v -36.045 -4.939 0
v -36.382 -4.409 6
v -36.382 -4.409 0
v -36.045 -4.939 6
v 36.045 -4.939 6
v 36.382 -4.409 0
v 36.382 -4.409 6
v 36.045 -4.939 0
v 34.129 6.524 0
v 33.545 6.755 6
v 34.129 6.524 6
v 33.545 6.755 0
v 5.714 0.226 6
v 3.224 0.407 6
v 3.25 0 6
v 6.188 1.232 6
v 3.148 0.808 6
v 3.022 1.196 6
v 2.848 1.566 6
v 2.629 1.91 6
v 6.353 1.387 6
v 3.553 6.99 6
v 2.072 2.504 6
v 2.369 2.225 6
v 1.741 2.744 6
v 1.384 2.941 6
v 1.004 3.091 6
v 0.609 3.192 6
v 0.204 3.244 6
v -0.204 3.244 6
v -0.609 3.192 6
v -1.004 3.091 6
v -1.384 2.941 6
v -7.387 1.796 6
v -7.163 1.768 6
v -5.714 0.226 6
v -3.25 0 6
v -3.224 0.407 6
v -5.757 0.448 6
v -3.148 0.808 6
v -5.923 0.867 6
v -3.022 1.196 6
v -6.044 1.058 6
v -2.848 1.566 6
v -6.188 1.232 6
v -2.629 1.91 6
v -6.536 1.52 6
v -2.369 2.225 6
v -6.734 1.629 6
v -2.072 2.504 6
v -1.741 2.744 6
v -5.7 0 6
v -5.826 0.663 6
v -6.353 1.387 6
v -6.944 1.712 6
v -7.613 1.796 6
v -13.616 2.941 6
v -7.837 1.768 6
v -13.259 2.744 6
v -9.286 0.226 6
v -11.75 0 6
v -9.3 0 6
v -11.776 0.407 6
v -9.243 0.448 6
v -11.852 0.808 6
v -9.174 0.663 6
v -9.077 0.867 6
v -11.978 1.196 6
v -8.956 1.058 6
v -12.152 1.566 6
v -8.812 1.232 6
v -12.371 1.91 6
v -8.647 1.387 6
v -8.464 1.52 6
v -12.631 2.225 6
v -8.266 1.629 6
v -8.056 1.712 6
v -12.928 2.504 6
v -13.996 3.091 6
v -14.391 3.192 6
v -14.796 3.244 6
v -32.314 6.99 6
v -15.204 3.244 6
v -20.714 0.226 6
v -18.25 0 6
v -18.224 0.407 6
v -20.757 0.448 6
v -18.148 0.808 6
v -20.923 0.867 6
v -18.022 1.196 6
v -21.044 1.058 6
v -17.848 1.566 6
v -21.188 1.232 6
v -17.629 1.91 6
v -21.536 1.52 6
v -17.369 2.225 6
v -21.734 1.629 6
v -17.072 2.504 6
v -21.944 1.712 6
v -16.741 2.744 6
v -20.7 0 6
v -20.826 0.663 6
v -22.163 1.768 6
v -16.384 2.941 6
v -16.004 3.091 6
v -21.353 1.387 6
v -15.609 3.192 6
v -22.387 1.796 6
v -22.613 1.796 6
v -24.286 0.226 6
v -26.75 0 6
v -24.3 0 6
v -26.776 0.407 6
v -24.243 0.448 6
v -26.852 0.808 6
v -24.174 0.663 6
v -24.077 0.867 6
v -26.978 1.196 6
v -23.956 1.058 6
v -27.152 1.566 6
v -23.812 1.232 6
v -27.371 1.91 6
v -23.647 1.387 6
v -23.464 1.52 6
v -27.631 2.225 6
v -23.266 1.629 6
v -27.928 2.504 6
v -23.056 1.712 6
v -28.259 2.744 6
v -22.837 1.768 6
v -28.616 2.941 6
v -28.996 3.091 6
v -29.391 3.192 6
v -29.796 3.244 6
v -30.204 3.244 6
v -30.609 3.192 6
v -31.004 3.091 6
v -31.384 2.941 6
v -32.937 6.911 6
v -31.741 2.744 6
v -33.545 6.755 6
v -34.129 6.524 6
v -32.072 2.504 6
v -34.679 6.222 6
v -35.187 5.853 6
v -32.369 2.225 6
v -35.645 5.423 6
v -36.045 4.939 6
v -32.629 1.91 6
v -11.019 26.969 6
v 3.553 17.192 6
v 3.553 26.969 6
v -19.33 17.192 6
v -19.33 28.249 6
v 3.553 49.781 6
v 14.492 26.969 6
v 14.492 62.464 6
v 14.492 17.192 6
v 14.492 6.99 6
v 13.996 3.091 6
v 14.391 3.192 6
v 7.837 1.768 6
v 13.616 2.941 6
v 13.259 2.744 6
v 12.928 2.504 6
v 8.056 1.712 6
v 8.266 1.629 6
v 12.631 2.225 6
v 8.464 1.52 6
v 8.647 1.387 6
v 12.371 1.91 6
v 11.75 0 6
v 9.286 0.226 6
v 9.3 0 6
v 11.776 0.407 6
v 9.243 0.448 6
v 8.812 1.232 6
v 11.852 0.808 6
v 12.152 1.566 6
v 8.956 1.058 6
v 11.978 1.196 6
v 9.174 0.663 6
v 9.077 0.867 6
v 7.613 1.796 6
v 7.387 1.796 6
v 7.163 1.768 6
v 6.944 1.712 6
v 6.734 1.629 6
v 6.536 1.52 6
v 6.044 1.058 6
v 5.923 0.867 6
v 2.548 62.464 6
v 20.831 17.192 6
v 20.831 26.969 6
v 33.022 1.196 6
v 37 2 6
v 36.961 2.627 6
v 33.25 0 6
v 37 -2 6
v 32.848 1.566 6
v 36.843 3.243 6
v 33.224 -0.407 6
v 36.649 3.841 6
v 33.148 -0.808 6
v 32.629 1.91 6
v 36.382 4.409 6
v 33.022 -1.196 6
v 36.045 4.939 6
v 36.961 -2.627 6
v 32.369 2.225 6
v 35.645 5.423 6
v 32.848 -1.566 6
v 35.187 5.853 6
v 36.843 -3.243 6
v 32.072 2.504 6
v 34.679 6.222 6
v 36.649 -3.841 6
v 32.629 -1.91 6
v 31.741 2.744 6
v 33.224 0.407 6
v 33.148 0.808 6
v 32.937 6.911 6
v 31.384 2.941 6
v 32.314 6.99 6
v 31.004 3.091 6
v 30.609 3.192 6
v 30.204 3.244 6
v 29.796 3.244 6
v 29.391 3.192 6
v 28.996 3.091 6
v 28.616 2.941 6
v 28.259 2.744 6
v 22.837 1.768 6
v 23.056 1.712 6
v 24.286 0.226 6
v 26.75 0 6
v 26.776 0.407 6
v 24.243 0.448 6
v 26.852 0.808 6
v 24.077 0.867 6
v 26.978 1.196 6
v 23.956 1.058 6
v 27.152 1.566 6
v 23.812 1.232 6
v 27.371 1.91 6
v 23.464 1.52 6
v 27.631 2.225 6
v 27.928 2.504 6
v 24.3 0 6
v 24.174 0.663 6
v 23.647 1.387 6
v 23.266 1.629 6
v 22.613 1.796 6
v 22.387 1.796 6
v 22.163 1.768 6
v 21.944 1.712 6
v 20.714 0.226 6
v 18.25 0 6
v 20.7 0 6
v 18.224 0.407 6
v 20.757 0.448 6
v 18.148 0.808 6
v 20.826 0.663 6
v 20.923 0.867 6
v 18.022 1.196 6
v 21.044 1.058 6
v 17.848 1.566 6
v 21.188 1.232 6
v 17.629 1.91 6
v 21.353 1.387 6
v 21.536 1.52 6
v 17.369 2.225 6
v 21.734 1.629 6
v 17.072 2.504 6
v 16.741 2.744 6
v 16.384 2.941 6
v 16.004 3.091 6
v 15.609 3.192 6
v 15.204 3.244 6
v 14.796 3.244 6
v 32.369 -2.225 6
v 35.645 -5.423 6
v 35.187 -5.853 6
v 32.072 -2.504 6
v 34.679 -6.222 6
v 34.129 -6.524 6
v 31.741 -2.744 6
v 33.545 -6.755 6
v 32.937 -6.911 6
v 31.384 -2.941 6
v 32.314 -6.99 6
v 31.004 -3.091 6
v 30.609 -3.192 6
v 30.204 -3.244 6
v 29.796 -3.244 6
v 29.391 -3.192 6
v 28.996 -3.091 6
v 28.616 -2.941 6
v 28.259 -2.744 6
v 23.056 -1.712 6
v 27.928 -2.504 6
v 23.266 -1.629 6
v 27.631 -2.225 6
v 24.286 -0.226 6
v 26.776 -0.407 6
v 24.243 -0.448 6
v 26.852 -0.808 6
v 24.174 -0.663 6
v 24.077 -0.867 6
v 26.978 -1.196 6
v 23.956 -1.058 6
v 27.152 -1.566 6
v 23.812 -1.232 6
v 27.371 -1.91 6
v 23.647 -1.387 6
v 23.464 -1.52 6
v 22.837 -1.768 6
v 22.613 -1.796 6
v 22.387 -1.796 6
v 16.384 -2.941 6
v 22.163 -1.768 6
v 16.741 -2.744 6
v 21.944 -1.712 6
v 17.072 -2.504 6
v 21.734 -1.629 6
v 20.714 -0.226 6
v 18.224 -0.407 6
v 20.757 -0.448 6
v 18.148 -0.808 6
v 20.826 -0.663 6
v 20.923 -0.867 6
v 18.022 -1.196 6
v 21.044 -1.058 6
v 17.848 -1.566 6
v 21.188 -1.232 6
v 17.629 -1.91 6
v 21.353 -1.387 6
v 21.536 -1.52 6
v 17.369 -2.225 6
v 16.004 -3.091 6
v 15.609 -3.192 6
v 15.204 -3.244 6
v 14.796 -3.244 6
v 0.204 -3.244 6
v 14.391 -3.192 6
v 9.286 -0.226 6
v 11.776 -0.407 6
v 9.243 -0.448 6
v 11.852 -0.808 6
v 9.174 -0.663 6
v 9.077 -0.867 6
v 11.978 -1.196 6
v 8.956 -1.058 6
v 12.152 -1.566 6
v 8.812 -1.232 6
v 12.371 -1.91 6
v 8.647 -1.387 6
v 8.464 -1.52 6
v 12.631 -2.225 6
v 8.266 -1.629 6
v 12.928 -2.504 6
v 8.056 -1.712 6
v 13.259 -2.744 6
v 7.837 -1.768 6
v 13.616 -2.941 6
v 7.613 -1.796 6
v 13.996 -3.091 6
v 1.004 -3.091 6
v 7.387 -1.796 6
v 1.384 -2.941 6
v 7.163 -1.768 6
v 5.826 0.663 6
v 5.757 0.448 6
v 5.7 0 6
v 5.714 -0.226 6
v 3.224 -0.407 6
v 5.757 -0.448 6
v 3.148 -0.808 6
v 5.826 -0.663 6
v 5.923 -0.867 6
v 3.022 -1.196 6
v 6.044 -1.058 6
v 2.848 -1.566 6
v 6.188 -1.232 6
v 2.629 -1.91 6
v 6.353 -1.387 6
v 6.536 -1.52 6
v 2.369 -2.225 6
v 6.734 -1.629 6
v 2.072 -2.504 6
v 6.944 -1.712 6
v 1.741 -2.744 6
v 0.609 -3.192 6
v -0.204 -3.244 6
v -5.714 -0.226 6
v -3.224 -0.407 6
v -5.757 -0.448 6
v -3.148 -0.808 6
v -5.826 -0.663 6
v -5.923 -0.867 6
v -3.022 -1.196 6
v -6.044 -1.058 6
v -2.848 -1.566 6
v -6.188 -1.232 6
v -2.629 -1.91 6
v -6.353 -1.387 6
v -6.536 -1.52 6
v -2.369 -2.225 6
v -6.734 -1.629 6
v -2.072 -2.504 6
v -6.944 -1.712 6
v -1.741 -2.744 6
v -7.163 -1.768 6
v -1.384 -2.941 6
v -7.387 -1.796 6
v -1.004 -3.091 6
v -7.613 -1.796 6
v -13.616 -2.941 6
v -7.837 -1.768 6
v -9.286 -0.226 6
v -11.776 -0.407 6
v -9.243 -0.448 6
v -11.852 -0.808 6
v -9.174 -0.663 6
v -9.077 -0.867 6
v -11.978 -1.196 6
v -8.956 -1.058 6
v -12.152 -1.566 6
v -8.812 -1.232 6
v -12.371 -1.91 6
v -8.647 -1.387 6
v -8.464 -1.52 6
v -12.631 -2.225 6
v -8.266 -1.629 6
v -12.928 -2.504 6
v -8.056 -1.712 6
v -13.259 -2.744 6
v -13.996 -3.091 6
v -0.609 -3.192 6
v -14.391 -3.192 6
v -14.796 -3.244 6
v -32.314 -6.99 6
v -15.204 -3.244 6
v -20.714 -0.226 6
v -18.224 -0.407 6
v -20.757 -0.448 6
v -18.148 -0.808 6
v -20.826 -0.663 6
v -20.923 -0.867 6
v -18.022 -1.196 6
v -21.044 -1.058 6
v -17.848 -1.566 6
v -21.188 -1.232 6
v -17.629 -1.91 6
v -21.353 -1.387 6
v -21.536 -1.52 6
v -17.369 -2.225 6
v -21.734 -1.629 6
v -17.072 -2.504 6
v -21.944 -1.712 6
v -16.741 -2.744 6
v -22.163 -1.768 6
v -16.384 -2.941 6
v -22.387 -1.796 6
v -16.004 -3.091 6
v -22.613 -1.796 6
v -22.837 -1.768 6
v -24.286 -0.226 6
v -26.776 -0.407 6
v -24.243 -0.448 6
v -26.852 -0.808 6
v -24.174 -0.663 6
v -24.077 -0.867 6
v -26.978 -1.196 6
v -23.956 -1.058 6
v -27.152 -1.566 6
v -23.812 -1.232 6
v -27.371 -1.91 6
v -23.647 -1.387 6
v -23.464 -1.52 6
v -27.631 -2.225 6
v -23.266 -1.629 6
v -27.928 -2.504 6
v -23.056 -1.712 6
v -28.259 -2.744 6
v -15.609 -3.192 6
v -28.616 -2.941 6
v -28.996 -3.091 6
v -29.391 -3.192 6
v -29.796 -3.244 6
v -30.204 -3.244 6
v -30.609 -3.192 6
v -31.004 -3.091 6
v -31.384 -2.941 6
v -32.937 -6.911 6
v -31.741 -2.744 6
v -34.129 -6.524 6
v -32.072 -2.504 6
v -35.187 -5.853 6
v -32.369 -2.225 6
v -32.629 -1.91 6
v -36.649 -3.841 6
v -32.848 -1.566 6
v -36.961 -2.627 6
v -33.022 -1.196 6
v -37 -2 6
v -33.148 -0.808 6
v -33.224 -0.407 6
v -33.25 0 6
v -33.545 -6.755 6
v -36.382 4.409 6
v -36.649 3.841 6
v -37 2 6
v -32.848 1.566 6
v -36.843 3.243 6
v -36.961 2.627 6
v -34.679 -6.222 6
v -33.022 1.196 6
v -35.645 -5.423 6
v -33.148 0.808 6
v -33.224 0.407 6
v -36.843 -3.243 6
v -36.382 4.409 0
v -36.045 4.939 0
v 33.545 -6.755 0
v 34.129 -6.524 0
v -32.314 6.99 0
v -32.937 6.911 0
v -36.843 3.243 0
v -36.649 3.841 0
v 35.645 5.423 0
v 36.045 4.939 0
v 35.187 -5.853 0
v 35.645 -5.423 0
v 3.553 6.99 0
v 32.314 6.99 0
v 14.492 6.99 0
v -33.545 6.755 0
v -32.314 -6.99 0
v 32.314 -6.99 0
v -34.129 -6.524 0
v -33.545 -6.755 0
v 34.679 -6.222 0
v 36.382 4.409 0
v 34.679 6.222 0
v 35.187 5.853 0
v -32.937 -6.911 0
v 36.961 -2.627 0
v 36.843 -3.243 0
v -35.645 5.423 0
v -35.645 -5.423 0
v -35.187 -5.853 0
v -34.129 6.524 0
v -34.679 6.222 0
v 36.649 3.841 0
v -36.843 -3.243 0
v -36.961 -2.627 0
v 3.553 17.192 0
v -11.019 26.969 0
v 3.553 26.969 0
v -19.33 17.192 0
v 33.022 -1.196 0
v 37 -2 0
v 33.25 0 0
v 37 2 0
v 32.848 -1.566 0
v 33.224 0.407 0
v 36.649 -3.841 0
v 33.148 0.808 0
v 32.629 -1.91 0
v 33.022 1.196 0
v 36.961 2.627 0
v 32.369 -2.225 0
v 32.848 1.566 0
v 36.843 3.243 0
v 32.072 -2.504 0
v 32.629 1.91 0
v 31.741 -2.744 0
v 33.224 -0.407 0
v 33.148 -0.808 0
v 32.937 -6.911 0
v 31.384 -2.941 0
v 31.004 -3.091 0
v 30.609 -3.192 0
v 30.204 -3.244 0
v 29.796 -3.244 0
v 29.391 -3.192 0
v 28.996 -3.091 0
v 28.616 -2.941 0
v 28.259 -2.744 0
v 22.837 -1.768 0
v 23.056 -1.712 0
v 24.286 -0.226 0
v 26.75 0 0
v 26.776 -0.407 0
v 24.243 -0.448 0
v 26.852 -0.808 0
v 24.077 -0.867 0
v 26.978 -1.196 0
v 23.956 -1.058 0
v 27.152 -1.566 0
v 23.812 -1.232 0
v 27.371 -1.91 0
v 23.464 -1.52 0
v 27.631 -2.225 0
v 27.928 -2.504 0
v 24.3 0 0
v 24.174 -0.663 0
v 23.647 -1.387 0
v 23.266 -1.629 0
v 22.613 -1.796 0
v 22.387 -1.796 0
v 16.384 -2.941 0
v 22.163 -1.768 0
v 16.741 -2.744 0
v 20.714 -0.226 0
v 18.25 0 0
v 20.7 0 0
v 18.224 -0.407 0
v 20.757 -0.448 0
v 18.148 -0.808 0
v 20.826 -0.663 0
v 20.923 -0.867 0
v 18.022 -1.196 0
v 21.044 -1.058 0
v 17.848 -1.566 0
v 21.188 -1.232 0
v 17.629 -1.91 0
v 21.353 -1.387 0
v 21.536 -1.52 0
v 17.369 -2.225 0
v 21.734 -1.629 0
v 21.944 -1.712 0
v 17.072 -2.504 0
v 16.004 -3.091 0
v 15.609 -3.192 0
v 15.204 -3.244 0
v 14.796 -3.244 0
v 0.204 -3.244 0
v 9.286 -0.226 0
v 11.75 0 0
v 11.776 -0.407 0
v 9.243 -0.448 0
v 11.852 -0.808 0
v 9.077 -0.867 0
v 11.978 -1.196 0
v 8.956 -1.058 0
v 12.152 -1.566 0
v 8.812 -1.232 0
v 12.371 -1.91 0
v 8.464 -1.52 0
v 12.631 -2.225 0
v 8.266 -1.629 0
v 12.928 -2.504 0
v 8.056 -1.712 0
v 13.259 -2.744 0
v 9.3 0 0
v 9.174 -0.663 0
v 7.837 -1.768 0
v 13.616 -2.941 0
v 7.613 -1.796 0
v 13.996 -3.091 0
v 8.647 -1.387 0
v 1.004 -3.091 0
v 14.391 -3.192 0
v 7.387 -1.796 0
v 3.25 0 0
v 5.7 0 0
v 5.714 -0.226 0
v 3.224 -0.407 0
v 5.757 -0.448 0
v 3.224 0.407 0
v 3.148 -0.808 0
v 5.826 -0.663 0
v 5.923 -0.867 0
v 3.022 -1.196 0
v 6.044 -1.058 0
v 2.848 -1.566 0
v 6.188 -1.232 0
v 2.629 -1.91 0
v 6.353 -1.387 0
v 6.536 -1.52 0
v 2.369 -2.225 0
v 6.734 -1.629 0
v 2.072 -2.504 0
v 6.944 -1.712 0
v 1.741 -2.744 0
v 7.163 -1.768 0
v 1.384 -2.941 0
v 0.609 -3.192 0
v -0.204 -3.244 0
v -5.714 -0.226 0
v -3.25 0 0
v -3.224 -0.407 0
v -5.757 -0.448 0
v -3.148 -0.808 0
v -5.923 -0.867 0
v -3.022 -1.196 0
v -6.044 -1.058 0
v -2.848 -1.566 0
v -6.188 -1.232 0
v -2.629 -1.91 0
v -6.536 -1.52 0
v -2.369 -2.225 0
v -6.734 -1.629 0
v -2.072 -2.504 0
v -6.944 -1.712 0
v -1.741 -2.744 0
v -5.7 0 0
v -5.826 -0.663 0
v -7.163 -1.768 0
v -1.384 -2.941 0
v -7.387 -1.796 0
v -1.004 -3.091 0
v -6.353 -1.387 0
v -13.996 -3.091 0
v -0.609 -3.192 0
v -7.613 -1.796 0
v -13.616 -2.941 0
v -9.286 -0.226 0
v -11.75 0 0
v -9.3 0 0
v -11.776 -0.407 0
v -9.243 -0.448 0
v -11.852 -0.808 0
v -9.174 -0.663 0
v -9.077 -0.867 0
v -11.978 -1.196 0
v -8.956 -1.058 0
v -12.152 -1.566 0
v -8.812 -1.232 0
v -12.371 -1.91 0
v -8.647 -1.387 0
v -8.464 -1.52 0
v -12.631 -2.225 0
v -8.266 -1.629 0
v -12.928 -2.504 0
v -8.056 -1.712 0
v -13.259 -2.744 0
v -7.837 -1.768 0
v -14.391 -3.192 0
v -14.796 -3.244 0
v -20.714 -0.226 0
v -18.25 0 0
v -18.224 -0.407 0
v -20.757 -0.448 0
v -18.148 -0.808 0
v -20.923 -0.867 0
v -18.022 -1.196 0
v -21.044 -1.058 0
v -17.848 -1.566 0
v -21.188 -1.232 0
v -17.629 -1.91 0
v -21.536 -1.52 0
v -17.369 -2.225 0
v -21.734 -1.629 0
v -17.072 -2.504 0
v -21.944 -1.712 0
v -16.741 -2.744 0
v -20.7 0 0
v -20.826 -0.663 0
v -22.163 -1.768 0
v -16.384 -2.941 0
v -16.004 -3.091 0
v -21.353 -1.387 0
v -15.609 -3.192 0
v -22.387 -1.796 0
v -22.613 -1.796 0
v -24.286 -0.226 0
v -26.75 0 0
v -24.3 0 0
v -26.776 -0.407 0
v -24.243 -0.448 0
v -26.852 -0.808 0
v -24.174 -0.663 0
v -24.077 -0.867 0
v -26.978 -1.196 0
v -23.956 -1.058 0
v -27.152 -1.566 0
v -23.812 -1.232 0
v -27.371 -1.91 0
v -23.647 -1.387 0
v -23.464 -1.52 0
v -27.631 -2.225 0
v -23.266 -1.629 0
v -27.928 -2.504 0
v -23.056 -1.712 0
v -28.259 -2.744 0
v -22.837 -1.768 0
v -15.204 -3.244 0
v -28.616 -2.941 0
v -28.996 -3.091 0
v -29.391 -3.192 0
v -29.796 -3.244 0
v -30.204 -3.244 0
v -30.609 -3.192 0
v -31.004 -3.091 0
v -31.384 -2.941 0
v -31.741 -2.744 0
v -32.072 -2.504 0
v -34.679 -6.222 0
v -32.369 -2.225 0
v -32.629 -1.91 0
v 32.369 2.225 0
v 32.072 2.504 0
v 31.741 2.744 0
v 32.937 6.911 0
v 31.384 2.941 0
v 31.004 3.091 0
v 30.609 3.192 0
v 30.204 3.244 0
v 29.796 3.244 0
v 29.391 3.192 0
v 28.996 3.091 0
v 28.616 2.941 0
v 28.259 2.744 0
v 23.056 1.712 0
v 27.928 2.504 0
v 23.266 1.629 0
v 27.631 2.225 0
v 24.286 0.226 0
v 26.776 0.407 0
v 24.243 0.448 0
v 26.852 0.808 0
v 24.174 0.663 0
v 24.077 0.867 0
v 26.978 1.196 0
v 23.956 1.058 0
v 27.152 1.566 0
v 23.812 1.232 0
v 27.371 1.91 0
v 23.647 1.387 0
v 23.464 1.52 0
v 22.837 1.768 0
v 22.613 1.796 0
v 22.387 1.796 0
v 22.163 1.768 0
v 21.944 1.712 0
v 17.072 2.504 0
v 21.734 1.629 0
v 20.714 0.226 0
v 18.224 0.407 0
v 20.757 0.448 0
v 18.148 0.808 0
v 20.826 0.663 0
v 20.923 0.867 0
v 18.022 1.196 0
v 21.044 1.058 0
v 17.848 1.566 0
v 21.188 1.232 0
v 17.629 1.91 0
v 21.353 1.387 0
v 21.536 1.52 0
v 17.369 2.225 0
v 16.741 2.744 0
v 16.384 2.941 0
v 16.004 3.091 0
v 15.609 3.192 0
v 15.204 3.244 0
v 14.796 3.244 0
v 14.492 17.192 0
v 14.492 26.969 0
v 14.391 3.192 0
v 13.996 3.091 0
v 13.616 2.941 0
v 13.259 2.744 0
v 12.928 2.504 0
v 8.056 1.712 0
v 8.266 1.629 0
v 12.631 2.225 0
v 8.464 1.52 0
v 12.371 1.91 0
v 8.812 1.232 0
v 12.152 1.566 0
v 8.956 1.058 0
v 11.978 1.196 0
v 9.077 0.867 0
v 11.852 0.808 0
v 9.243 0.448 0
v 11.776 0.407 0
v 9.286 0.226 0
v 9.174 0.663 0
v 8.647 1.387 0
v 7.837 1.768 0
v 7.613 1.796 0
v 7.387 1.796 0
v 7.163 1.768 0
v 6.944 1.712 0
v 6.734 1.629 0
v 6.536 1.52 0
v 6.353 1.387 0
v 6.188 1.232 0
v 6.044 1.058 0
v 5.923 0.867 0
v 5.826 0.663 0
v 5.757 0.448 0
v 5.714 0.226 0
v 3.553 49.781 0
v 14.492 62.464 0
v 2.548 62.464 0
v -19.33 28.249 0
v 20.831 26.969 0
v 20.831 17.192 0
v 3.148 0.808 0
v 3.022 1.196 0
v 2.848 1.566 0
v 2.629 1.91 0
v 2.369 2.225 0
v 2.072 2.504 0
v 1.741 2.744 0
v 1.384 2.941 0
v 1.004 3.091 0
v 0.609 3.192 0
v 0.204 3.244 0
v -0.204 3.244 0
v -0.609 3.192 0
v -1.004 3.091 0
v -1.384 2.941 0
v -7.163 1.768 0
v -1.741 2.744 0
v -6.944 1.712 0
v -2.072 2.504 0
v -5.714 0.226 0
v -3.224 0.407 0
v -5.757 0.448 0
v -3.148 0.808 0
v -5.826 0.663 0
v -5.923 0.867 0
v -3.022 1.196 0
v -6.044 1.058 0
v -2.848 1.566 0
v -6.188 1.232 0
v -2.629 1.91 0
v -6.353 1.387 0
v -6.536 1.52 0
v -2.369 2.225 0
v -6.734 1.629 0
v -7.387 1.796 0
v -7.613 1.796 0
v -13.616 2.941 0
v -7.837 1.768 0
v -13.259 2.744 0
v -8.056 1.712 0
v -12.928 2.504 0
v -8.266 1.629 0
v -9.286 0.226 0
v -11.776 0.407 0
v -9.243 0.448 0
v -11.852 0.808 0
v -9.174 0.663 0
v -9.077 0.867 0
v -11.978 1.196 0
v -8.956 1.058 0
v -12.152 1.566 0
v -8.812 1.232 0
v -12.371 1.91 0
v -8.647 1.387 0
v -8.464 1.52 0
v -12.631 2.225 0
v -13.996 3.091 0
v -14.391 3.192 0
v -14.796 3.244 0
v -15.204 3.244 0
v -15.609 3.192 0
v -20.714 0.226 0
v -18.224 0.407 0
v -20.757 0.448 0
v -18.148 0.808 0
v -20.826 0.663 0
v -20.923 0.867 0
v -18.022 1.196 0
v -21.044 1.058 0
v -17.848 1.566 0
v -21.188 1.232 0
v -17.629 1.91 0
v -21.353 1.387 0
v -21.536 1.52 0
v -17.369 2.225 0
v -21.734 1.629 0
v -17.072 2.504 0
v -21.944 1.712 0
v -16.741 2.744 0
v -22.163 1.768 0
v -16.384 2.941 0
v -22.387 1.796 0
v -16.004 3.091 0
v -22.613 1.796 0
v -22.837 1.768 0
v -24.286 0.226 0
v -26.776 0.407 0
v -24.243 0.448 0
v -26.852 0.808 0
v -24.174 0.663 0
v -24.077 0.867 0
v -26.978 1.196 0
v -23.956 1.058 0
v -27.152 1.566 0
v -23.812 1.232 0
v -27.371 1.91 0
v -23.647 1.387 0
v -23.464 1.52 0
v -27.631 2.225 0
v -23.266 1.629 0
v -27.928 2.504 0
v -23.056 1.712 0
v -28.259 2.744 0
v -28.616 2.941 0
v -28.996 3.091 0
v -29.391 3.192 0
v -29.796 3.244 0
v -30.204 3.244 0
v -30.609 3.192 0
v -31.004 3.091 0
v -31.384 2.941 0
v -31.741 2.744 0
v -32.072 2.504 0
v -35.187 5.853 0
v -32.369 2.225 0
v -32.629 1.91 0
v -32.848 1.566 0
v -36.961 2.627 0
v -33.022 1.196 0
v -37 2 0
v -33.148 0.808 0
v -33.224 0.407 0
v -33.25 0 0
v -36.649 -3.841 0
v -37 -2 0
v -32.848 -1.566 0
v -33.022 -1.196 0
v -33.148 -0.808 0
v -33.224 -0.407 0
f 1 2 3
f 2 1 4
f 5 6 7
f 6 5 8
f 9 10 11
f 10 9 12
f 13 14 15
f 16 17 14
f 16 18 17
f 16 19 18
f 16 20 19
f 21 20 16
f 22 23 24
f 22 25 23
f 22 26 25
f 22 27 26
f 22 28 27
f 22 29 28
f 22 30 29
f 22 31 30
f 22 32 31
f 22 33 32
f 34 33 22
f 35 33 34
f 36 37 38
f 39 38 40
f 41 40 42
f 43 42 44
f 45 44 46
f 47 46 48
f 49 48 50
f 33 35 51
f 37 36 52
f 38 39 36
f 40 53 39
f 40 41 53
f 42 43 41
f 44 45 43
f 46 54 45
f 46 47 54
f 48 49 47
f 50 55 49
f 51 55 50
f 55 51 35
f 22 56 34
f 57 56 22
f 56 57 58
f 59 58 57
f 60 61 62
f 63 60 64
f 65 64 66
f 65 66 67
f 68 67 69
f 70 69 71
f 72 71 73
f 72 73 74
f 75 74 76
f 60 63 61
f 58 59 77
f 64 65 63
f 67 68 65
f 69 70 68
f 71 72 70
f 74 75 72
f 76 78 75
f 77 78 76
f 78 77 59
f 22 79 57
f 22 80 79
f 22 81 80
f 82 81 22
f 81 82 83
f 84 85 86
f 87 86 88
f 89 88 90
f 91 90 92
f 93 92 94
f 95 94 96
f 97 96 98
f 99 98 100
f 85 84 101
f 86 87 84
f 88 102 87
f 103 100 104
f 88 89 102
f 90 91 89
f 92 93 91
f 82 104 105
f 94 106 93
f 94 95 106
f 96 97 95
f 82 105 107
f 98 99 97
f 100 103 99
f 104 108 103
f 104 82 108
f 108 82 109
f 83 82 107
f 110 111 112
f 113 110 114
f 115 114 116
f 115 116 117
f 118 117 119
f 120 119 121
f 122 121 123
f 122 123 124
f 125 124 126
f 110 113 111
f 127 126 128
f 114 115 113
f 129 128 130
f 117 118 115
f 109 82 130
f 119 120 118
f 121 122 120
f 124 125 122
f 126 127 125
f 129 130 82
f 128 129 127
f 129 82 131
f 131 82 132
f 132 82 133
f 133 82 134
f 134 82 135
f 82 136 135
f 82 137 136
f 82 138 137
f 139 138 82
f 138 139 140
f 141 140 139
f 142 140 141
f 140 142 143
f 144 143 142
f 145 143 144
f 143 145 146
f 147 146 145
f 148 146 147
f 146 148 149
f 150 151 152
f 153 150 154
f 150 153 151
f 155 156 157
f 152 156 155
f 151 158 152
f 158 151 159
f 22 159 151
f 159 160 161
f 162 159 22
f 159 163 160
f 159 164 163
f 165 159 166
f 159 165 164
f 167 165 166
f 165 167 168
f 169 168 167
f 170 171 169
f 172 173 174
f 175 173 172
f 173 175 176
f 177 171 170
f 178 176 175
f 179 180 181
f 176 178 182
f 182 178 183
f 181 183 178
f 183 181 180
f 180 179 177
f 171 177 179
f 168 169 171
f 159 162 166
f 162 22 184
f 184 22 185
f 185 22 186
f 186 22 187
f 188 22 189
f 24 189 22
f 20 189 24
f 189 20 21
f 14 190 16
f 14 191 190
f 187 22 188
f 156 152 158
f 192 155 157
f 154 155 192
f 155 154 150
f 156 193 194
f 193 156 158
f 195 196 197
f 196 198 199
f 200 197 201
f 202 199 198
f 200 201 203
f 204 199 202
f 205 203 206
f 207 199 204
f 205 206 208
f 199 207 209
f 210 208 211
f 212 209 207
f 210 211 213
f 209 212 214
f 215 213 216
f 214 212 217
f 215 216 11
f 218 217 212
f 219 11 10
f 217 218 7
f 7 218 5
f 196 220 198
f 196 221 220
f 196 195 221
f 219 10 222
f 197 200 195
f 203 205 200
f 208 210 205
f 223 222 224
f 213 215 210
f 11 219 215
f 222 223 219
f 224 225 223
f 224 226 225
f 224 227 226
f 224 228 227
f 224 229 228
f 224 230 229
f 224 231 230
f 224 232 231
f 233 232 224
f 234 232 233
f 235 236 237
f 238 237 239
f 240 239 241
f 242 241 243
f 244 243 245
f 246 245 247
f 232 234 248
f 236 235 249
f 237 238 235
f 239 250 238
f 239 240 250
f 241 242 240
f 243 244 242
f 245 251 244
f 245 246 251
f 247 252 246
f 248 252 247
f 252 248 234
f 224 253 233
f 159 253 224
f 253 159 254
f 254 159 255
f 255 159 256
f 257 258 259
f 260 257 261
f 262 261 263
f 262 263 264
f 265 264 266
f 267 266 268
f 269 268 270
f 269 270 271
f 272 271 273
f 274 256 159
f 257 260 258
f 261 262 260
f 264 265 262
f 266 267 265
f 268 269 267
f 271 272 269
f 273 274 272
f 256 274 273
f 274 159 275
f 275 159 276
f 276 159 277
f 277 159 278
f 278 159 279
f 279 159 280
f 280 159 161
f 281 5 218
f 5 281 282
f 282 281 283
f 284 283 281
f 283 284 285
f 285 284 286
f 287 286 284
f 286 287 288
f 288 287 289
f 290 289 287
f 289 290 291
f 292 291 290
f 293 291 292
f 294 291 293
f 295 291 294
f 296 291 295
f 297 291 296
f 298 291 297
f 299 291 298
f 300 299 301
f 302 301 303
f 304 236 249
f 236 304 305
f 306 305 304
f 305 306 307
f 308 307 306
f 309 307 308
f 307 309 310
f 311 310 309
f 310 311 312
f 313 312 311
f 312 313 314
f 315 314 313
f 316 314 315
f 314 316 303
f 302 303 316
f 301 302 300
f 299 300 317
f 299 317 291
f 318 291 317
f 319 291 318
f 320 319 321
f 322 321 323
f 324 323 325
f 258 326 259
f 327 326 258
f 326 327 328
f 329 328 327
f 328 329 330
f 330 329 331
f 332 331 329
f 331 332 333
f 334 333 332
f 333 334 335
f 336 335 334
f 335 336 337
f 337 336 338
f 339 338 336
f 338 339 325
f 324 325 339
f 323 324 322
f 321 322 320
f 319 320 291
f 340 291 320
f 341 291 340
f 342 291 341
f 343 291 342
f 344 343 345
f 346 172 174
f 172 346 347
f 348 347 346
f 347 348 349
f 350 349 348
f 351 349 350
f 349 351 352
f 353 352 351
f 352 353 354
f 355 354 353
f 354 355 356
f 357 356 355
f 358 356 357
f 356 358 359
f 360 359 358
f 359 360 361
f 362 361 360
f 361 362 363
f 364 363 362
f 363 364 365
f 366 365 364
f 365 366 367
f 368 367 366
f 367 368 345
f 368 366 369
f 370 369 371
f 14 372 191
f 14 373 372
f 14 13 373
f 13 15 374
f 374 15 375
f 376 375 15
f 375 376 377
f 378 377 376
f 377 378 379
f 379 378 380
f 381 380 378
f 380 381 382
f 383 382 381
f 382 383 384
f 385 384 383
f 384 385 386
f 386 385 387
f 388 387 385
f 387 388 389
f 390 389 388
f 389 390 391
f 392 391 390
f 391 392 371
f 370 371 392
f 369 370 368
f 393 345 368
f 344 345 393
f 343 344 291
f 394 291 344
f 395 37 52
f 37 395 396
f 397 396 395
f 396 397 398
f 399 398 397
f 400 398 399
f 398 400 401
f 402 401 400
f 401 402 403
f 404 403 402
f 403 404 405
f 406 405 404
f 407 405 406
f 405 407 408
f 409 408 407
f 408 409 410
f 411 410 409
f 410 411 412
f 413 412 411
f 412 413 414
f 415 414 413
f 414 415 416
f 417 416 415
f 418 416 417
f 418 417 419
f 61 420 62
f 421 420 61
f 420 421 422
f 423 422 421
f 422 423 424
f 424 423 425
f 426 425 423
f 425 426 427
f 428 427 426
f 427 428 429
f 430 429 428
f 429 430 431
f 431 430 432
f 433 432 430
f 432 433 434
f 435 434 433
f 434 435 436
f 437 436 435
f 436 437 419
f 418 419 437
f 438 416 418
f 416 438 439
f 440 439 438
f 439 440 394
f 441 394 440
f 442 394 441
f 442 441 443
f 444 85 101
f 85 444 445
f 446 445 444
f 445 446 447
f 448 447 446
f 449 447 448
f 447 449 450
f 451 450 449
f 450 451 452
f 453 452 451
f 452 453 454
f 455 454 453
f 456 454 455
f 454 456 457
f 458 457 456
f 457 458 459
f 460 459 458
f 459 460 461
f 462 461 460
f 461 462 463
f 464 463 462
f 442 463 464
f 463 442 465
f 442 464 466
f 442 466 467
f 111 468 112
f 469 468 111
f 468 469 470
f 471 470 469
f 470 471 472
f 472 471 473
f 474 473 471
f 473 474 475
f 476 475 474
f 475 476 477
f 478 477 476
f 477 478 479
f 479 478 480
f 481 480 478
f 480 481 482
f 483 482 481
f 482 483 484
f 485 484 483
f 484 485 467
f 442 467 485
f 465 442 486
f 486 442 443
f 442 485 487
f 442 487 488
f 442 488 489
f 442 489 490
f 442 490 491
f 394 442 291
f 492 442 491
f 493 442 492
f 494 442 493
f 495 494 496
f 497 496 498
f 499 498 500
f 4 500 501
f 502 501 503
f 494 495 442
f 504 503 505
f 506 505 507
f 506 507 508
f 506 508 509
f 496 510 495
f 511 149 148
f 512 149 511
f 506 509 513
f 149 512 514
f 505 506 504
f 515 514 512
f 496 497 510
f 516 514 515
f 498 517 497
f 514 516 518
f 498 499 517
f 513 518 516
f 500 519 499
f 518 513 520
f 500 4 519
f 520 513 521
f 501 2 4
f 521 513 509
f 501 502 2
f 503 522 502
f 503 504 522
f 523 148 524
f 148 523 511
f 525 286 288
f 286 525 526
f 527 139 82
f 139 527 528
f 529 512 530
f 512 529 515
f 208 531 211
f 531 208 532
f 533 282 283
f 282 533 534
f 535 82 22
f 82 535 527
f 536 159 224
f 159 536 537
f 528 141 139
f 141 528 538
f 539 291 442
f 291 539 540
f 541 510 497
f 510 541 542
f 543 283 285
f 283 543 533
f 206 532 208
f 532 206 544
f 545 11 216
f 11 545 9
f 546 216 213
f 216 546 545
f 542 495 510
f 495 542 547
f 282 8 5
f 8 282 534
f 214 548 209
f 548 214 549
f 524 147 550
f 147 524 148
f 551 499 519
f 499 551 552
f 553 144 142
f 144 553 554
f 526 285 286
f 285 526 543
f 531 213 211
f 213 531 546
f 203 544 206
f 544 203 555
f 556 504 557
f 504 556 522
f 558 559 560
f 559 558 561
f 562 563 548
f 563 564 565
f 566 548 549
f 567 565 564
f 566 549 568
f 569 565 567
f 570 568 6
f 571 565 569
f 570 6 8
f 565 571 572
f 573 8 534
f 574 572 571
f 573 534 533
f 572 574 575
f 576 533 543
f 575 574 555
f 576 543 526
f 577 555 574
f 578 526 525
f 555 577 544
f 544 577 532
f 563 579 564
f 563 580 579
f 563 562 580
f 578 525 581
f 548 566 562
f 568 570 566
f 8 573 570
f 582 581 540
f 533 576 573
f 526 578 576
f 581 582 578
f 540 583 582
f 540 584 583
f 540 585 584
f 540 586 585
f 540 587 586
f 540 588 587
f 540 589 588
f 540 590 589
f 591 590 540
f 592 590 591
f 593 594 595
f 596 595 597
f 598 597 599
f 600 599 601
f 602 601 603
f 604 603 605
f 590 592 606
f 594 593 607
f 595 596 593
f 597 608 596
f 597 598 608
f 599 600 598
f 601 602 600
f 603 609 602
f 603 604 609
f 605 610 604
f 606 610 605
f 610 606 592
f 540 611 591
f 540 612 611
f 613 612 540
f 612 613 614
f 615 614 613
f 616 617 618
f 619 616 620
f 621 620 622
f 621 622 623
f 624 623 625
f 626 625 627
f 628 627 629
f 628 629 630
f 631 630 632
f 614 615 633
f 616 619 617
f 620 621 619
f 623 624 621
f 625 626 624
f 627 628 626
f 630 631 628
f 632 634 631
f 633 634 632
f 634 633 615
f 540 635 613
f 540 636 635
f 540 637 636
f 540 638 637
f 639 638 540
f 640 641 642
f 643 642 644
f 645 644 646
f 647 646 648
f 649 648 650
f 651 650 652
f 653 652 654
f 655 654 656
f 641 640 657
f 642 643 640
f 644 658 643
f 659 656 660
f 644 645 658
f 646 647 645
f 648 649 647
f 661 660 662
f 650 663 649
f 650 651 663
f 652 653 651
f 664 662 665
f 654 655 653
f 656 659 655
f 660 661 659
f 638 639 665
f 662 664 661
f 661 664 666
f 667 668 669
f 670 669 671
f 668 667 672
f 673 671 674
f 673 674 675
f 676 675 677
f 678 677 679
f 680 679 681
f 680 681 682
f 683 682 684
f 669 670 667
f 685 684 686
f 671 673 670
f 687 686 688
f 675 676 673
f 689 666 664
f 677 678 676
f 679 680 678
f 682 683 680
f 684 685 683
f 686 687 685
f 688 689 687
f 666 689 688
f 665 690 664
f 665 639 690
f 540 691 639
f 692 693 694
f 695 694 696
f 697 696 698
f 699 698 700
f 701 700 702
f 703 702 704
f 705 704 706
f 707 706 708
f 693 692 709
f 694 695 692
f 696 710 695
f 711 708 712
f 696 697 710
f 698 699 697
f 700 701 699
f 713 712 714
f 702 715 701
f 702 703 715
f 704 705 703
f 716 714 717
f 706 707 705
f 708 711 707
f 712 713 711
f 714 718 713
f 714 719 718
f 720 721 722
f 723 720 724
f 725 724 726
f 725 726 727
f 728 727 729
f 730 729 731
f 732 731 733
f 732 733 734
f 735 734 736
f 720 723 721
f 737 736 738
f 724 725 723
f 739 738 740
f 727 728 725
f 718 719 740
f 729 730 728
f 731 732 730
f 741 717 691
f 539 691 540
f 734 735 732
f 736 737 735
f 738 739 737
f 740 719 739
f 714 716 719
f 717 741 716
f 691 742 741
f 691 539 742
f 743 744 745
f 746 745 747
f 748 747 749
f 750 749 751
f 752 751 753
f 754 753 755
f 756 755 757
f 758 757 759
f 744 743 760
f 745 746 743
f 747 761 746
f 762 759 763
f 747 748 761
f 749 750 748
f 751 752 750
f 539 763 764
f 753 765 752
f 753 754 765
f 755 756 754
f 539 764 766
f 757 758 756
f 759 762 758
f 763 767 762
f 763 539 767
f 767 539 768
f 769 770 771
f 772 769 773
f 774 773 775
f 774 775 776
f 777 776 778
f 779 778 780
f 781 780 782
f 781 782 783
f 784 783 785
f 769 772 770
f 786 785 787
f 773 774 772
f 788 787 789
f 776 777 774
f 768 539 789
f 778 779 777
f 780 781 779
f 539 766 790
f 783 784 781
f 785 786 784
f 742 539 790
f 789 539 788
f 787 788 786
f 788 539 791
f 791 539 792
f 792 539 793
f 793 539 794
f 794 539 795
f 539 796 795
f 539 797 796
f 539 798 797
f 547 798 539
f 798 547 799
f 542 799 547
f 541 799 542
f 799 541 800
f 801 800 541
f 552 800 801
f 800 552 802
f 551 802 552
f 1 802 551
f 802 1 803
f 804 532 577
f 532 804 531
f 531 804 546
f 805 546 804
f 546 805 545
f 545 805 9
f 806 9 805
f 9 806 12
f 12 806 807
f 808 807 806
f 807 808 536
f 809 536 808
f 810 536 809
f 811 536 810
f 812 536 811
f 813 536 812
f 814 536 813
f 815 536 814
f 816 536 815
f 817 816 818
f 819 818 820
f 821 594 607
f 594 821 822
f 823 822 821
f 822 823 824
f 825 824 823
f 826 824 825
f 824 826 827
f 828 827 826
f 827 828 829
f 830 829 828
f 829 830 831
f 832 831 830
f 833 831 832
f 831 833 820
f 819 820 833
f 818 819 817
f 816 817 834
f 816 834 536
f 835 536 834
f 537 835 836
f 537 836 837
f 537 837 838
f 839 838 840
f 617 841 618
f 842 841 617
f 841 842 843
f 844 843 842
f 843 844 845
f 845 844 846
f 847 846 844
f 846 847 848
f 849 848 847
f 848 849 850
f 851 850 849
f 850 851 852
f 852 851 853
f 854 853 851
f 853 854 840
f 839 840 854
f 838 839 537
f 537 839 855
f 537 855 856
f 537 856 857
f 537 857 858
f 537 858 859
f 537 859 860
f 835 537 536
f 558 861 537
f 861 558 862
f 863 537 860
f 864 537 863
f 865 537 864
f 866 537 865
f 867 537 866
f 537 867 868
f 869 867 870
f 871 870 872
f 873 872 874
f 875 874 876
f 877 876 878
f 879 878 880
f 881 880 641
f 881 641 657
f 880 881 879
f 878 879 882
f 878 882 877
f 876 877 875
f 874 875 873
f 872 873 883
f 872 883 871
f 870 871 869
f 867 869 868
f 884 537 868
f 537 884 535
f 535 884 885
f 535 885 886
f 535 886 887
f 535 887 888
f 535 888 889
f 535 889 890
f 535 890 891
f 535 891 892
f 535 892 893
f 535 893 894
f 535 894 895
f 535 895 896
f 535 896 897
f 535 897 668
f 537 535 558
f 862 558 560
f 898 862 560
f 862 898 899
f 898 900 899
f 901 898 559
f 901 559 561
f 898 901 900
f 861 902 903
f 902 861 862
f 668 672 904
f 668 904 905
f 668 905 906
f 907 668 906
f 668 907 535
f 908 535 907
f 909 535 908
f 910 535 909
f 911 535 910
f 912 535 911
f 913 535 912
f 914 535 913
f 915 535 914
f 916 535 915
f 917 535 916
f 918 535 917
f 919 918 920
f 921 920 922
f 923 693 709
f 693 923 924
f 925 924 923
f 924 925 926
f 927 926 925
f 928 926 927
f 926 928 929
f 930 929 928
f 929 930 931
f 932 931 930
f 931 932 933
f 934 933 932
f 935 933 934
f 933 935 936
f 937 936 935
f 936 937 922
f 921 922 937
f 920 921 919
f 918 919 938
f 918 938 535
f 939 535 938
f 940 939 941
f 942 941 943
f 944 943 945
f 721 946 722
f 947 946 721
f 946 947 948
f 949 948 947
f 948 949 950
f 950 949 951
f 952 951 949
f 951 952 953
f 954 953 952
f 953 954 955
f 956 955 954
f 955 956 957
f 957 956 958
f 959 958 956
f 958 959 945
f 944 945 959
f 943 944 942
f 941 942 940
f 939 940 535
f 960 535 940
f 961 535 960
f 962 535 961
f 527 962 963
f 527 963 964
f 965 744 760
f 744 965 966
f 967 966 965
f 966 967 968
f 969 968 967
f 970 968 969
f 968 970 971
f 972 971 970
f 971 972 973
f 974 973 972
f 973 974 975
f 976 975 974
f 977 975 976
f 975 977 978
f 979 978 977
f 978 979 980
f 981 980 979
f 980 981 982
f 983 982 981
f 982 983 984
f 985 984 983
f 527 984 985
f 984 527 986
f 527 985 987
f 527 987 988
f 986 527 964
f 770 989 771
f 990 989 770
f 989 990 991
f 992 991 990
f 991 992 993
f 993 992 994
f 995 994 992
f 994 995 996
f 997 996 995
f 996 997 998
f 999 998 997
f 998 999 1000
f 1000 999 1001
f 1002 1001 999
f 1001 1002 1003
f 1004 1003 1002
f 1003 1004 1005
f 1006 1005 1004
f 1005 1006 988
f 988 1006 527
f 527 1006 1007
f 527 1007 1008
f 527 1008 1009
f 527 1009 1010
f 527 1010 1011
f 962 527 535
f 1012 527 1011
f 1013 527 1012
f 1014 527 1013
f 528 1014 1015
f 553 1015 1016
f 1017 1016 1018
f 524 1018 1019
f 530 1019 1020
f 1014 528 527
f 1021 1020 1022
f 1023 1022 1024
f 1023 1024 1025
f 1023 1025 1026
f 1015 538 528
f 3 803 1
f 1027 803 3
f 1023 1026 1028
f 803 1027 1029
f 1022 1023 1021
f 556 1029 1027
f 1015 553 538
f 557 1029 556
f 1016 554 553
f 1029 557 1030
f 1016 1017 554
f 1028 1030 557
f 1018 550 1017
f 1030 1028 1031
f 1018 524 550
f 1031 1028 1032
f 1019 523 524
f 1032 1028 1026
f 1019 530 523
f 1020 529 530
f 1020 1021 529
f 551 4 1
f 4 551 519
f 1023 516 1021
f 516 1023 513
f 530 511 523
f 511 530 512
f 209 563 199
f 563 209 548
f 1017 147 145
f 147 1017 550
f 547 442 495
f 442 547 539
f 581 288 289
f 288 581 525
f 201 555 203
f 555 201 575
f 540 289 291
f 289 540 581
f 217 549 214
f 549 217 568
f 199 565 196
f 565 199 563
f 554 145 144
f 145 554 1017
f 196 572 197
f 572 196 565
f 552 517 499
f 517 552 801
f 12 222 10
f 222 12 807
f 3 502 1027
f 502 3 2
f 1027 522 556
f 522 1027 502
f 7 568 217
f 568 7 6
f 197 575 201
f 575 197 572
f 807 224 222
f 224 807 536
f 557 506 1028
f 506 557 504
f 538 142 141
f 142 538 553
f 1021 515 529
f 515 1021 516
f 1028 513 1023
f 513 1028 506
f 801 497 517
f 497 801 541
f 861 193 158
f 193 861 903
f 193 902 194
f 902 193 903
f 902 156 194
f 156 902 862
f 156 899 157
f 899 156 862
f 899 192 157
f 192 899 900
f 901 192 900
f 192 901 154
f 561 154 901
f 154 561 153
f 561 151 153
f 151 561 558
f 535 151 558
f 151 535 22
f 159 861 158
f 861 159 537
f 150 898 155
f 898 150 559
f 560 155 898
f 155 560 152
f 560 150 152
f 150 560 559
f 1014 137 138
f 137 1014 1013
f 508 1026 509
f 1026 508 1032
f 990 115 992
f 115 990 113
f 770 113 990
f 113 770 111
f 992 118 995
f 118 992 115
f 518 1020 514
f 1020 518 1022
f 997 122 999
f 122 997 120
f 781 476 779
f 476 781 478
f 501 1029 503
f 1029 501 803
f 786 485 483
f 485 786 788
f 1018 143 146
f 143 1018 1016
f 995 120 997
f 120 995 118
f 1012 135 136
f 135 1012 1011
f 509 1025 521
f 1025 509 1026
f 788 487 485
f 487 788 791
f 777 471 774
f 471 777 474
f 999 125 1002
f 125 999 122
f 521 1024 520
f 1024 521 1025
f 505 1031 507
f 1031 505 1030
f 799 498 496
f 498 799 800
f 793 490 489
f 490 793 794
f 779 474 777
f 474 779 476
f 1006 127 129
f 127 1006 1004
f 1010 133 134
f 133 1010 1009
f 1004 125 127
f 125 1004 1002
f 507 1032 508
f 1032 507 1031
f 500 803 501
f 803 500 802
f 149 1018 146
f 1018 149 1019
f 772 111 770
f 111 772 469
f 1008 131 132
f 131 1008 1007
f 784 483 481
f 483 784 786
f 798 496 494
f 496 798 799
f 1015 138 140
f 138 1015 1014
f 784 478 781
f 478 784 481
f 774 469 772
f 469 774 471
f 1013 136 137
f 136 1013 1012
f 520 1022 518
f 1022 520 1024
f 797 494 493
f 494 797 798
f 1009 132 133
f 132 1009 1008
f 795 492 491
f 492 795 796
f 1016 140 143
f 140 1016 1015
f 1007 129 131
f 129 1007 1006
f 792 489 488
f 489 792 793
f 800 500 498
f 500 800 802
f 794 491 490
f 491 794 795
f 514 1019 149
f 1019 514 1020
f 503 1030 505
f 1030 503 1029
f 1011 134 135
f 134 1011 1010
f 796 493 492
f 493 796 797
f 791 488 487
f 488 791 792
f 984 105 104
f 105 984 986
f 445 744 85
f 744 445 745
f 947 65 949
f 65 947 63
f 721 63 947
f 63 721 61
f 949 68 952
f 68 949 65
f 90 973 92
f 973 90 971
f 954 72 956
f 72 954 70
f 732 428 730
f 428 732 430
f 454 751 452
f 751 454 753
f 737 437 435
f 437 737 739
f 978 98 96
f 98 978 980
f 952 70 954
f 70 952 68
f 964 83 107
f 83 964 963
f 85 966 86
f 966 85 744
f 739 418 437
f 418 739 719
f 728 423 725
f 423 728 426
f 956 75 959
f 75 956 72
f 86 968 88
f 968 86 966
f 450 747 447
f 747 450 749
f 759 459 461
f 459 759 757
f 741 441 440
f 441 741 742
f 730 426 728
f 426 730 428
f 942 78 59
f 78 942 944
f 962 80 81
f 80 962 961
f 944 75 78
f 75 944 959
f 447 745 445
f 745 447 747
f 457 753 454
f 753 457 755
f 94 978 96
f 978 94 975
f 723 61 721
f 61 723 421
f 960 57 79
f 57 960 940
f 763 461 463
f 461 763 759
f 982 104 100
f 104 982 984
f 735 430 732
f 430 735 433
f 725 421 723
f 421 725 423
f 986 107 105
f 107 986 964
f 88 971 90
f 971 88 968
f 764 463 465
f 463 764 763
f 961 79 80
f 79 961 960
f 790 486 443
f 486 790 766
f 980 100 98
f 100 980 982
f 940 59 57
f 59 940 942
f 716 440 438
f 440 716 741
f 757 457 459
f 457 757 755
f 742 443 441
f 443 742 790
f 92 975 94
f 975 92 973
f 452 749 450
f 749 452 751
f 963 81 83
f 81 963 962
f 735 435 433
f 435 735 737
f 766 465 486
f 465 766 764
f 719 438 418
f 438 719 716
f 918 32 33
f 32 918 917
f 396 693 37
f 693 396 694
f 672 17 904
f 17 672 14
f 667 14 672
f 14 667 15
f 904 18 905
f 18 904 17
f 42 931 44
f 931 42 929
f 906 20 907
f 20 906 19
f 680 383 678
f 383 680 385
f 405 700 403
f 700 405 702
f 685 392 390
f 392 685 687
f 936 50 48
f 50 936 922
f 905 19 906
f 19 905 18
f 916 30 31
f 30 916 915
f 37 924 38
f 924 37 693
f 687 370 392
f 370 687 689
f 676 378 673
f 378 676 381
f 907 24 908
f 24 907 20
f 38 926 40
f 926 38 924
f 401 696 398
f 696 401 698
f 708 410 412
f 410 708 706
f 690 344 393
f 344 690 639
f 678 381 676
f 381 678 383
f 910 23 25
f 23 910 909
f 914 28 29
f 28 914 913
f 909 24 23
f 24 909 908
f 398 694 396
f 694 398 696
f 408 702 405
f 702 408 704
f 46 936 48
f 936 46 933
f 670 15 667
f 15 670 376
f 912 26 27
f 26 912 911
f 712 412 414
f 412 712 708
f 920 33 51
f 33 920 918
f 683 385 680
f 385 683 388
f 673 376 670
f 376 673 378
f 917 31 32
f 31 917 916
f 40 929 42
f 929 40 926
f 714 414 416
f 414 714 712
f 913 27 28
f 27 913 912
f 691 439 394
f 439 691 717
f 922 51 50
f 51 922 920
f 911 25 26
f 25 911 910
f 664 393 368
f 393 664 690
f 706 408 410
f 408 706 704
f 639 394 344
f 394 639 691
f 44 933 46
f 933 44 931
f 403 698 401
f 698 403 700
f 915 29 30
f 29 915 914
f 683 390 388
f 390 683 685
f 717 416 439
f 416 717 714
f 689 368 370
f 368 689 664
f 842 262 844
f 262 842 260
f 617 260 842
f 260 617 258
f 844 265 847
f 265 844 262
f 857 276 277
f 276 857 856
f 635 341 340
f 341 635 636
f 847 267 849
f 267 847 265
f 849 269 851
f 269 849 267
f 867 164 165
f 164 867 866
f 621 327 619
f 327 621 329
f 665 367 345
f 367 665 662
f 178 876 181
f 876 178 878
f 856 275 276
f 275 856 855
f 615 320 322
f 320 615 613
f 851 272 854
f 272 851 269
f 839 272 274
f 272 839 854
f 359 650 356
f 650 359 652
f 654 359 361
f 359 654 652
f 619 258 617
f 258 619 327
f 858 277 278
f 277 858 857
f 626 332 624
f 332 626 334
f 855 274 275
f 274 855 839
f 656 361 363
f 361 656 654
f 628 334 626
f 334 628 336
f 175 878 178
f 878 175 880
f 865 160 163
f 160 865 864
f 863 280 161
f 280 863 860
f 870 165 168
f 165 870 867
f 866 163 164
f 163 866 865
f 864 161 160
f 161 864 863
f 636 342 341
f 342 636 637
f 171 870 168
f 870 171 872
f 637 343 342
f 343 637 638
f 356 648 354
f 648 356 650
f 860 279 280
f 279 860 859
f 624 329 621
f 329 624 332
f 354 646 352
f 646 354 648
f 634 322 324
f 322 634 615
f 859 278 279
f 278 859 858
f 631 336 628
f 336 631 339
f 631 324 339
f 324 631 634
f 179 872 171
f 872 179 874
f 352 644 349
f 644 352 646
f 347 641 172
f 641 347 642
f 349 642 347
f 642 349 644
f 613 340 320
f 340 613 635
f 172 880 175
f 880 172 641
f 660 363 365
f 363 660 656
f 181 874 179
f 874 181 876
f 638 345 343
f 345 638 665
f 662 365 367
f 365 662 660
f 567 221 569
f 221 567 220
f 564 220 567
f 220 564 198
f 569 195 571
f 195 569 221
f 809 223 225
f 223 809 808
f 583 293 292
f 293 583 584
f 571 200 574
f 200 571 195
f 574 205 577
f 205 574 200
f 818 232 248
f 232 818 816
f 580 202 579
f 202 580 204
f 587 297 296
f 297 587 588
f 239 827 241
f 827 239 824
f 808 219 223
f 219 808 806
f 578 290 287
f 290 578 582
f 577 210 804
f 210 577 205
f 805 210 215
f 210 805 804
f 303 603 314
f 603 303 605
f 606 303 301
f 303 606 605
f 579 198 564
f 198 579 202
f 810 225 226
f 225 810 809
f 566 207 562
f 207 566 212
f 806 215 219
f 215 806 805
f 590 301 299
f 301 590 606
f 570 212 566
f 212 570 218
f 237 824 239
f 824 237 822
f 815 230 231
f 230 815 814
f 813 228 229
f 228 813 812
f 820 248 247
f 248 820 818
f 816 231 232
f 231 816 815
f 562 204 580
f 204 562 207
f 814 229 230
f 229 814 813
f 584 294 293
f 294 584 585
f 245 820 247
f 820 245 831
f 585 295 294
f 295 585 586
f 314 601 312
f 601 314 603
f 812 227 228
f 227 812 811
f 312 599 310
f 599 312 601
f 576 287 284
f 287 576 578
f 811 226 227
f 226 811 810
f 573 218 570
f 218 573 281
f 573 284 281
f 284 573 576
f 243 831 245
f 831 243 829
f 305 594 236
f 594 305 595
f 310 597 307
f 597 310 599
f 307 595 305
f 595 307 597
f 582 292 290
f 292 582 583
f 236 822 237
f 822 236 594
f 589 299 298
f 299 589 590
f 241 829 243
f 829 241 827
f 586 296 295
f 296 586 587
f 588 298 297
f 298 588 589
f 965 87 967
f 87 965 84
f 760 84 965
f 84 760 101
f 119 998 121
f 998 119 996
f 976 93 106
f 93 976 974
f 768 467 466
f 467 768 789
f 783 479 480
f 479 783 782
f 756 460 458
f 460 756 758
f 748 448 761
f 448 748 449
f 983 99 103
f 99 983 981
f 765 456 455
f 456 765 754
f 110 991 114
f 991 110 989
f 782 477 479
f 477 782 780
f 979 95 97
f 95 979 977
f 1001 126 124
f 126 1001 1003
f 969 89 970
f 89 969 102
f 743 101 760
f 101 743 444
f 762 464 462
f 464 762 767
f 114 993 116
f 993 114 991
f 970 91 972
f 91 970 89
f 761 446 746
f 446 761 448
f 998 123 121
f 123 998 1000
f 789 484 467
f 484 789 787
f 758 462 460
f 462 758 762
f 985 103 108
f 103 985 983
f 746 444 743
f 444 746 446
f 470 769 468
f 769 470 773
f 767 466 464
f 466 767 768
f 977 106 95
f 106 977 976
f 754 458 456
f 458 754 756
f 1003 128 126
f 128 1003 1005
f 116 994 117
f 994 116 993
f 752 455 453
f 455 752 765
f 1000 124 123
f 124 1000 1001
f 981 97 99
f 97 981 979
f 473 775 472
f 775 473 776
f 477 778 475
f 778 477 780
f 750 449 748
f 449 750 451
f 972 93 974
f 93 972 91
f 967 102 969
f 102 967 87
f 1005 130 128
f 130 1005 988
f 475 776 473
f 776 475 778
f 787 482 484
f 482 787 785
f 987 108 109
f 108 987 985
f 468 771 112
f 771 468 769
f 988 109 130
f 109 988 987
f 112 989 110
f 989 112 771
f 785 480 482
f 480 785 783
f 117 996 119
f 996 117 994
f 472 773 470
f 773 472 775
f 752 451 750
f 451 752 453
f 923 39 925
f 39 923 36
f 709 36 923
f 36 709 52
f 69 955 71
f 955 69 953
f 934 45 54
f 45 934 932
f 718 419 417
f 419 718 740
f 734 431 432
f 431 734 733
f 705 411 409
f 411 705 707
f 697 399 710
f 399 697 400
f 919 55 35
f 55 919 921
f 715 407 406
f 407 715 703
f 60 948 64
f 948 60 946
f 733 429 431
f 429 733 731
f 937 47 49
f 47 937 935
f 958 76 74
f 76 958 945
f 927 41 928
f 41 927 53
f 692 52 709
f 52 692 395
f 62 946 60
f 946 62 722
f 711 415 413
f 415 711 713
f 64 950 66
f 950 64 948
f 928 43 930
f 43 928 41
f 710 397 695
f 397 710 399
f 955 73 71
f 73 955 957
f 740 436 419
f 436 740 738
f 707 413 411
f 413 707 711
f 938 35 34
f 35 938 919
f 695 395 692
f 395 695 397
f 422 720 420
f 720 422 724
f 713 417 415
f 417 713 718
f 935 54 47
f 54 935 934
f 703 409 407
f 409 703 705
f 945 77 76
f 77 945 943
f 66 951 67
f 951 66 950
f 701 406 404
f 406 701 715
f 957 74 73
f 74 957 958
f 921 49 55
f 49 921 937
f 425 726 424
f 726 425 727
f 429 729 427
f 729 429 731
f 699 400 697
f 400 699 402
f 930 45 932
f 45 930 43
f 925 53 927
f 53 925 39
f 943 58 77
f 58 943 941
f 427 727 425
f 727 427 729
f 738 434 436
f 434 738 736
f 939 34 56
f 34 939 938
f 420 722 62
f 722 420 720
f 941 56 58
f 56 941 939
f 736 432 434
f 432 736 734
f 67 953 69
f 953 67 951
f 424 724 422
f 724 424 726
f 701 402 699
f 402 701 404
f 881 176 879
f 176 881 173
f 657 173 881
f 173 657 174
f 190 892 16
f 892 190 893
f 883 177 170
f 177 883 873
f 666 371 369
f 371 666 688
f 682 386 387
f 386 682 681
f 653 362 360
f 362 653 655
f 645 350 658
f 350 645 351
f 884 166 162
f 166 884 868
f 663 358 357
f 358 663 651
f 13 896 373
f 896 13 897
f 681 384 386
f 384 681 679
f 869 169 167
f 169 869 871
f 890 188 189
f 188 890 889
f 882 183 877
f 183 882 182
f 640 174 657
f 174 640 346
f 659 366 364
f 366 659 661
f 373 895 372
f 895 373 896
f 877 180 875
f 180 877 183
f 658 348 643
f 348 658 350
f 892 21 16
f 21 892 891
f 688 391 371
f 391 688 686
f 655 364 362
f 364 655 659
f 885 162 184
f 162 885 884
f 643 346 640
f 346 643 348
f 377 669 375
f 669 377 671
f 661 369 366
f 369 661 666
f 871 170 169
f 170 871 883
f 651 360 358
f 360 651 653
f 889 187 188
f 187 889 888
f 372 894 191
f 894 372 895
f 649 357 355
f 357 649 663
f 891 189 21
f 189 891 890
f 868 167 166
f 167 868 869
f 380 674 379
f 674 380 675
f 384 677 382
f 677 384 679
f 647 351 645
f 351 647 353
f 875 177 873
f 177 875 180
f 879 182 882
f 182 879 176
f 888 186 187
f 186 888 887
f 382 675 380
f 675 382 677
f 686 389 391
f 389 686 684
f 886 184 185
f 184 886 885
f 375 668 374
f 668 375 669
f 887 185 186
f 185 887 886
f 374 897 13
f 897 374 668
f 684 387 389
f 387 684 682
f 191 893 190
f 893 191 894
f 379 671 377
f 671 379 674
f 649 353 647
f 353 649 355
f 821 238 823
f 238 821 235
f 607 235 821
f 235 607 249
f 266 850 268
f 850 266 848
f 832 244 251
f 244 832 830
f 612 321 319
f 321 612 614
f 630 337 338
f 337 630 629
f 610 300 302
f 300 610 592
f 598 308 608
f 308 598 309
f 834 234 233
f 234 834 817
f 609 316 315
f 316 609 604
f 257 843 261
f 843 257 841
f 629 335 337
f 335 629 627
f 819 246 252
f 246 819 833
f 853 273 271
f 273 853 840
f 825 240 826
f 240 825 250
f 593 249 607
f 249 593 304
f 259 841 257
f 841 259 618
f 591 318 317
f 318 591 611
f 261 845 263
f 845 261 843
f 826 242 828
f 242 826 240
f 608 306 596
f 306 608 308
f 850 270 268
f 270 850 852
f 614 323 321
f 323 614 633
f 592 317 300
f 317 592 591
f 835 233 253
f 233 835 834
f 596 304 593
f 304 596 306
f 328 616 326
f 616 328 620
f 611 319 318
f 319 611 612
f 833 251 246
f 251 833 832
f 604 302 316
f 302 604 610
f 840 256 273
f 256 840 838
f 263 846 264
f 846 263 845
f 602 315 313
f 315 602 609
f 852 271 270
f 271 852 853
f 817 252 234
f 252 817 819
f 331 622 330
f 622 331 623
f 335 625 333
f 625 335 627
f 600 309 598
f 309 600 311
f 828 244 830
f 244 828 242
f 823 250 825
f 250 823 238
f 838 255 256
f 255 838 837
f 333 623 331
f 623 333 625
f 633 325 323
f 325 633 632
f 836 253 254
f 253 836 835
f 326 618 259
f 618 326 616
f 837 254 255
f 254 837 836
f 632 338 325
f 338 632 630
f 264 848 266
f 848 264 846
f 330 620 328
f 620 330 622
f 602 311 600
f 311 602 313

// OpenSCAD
$fn = 50;


difference() {
	union() {
		hull() {
			translate(v = [-32.0000000000, 2.0000000000, 0]) {
				cylinder(h = 6, r = 5);
			}
			translate(v = [32.0000000000, 2.0000000000, 0]) {
				cylinder(h = 6, r = 5);
			}
			translate(v = [-32.0000000000, -2.0000000000, 0]) {
				cylinder(h = 6, r = 5);
			}
			translate(v = [32.0000000000, -2.0000000000, 0]) {
				cylinder(h = 6, r = 5);
			}
		}
		translate(v = [0, 61.1111111111, 0]) {
			linear_extrude(height = 6) {
				text(font = "DejaVu Sans Mono:style=Bold", halign = "center", size = 57.0000000000, text = "4", valign = "top");
			}
		}
	}
	union() {
		translate(v = [-30.0000000000, 0.0000000000, 0]) {
			translate(v = [0, 0, -100]) {
				cylinder(h = 200, r = 3.2500000000);
			}
		}
		translate(v = [-15.0000000000, 0.0000000000, 0]) {
			translate(v = [0, 0, -100]) {
				cylinder(h = 200, r = 3.2500000000);
			}
		}
		translate(v = [0, 0, -100]) {
			cylinder(h = 200, r = 3.2500000000);
		}
		translate(v = [15.0000000000, 0.0000000000, 0]) {
			translate(v = [0, 0, -100]) {
				cylinder(h = 200, r = 3.2500000000);
			}
		}
		translate(v = [30.0000000000, 0.0000000000, 0]) {
			translate(v = [0, 0, -100]) {
				cylinder(h = 200, r = 3.2500000000);
			}
		}
		translate(v = [-30.0000000000, 0.0000000000, 0]) {
			translate(v = [0, 0, -100]) {
				cylinder(h = 200, r = 1.8000000000);
			}
		}
		translate(v = [-22.5000000000, 0.0000000000, 0]) {
			translate(v = [0, 0, -100]) {
				cylinder(h = 200, r = 1.8000000000);
			}
		}
		translate(v = [-15.0000000000, 0.0000000000, 0]) {
			translate(v = [0, 0, -100]) {
				cylinder(h = 200, r = 1.8000000000);
			}
		}
		translate(v = [-7.5000000000, 0.0000000000, 0]) {
			translate(v = [0, 0, -100]) {
				cylinder(h = 200, r = 1.8000000000);
			}
		}
		translate(v = [0, 0, -100]) {
			cylinder(h = 200, r = 1.8000000000);
		}
		translate(v = [7.5000000000, 0.0000000000, 0]) {
			translate(v = [0, 0, -100]) {
				cylinder(h = 200, r = 1.8000000000);
			}
		}
		translate(v = [15.0000000000, 0.0000000000, 0]) {
			translate(v = [0, 0, -100]) {
				cylinder(h = 200, r = 1.8000000000);
			}
		}
		translate(v = [22.5000000000, 0.0000000000, 0]) {
			translate(v = [0, 0, -100]) {
				cylinder(h = 200, r = 1.8000000000);
			}
		}
		translate(v = [30.0000000000, 0.0000000000, 0]) {
			translate(v = [0, 0, -100]) {
				cylinder(h = 200, r = 1.8000000000);
			}
		}
	}
}
